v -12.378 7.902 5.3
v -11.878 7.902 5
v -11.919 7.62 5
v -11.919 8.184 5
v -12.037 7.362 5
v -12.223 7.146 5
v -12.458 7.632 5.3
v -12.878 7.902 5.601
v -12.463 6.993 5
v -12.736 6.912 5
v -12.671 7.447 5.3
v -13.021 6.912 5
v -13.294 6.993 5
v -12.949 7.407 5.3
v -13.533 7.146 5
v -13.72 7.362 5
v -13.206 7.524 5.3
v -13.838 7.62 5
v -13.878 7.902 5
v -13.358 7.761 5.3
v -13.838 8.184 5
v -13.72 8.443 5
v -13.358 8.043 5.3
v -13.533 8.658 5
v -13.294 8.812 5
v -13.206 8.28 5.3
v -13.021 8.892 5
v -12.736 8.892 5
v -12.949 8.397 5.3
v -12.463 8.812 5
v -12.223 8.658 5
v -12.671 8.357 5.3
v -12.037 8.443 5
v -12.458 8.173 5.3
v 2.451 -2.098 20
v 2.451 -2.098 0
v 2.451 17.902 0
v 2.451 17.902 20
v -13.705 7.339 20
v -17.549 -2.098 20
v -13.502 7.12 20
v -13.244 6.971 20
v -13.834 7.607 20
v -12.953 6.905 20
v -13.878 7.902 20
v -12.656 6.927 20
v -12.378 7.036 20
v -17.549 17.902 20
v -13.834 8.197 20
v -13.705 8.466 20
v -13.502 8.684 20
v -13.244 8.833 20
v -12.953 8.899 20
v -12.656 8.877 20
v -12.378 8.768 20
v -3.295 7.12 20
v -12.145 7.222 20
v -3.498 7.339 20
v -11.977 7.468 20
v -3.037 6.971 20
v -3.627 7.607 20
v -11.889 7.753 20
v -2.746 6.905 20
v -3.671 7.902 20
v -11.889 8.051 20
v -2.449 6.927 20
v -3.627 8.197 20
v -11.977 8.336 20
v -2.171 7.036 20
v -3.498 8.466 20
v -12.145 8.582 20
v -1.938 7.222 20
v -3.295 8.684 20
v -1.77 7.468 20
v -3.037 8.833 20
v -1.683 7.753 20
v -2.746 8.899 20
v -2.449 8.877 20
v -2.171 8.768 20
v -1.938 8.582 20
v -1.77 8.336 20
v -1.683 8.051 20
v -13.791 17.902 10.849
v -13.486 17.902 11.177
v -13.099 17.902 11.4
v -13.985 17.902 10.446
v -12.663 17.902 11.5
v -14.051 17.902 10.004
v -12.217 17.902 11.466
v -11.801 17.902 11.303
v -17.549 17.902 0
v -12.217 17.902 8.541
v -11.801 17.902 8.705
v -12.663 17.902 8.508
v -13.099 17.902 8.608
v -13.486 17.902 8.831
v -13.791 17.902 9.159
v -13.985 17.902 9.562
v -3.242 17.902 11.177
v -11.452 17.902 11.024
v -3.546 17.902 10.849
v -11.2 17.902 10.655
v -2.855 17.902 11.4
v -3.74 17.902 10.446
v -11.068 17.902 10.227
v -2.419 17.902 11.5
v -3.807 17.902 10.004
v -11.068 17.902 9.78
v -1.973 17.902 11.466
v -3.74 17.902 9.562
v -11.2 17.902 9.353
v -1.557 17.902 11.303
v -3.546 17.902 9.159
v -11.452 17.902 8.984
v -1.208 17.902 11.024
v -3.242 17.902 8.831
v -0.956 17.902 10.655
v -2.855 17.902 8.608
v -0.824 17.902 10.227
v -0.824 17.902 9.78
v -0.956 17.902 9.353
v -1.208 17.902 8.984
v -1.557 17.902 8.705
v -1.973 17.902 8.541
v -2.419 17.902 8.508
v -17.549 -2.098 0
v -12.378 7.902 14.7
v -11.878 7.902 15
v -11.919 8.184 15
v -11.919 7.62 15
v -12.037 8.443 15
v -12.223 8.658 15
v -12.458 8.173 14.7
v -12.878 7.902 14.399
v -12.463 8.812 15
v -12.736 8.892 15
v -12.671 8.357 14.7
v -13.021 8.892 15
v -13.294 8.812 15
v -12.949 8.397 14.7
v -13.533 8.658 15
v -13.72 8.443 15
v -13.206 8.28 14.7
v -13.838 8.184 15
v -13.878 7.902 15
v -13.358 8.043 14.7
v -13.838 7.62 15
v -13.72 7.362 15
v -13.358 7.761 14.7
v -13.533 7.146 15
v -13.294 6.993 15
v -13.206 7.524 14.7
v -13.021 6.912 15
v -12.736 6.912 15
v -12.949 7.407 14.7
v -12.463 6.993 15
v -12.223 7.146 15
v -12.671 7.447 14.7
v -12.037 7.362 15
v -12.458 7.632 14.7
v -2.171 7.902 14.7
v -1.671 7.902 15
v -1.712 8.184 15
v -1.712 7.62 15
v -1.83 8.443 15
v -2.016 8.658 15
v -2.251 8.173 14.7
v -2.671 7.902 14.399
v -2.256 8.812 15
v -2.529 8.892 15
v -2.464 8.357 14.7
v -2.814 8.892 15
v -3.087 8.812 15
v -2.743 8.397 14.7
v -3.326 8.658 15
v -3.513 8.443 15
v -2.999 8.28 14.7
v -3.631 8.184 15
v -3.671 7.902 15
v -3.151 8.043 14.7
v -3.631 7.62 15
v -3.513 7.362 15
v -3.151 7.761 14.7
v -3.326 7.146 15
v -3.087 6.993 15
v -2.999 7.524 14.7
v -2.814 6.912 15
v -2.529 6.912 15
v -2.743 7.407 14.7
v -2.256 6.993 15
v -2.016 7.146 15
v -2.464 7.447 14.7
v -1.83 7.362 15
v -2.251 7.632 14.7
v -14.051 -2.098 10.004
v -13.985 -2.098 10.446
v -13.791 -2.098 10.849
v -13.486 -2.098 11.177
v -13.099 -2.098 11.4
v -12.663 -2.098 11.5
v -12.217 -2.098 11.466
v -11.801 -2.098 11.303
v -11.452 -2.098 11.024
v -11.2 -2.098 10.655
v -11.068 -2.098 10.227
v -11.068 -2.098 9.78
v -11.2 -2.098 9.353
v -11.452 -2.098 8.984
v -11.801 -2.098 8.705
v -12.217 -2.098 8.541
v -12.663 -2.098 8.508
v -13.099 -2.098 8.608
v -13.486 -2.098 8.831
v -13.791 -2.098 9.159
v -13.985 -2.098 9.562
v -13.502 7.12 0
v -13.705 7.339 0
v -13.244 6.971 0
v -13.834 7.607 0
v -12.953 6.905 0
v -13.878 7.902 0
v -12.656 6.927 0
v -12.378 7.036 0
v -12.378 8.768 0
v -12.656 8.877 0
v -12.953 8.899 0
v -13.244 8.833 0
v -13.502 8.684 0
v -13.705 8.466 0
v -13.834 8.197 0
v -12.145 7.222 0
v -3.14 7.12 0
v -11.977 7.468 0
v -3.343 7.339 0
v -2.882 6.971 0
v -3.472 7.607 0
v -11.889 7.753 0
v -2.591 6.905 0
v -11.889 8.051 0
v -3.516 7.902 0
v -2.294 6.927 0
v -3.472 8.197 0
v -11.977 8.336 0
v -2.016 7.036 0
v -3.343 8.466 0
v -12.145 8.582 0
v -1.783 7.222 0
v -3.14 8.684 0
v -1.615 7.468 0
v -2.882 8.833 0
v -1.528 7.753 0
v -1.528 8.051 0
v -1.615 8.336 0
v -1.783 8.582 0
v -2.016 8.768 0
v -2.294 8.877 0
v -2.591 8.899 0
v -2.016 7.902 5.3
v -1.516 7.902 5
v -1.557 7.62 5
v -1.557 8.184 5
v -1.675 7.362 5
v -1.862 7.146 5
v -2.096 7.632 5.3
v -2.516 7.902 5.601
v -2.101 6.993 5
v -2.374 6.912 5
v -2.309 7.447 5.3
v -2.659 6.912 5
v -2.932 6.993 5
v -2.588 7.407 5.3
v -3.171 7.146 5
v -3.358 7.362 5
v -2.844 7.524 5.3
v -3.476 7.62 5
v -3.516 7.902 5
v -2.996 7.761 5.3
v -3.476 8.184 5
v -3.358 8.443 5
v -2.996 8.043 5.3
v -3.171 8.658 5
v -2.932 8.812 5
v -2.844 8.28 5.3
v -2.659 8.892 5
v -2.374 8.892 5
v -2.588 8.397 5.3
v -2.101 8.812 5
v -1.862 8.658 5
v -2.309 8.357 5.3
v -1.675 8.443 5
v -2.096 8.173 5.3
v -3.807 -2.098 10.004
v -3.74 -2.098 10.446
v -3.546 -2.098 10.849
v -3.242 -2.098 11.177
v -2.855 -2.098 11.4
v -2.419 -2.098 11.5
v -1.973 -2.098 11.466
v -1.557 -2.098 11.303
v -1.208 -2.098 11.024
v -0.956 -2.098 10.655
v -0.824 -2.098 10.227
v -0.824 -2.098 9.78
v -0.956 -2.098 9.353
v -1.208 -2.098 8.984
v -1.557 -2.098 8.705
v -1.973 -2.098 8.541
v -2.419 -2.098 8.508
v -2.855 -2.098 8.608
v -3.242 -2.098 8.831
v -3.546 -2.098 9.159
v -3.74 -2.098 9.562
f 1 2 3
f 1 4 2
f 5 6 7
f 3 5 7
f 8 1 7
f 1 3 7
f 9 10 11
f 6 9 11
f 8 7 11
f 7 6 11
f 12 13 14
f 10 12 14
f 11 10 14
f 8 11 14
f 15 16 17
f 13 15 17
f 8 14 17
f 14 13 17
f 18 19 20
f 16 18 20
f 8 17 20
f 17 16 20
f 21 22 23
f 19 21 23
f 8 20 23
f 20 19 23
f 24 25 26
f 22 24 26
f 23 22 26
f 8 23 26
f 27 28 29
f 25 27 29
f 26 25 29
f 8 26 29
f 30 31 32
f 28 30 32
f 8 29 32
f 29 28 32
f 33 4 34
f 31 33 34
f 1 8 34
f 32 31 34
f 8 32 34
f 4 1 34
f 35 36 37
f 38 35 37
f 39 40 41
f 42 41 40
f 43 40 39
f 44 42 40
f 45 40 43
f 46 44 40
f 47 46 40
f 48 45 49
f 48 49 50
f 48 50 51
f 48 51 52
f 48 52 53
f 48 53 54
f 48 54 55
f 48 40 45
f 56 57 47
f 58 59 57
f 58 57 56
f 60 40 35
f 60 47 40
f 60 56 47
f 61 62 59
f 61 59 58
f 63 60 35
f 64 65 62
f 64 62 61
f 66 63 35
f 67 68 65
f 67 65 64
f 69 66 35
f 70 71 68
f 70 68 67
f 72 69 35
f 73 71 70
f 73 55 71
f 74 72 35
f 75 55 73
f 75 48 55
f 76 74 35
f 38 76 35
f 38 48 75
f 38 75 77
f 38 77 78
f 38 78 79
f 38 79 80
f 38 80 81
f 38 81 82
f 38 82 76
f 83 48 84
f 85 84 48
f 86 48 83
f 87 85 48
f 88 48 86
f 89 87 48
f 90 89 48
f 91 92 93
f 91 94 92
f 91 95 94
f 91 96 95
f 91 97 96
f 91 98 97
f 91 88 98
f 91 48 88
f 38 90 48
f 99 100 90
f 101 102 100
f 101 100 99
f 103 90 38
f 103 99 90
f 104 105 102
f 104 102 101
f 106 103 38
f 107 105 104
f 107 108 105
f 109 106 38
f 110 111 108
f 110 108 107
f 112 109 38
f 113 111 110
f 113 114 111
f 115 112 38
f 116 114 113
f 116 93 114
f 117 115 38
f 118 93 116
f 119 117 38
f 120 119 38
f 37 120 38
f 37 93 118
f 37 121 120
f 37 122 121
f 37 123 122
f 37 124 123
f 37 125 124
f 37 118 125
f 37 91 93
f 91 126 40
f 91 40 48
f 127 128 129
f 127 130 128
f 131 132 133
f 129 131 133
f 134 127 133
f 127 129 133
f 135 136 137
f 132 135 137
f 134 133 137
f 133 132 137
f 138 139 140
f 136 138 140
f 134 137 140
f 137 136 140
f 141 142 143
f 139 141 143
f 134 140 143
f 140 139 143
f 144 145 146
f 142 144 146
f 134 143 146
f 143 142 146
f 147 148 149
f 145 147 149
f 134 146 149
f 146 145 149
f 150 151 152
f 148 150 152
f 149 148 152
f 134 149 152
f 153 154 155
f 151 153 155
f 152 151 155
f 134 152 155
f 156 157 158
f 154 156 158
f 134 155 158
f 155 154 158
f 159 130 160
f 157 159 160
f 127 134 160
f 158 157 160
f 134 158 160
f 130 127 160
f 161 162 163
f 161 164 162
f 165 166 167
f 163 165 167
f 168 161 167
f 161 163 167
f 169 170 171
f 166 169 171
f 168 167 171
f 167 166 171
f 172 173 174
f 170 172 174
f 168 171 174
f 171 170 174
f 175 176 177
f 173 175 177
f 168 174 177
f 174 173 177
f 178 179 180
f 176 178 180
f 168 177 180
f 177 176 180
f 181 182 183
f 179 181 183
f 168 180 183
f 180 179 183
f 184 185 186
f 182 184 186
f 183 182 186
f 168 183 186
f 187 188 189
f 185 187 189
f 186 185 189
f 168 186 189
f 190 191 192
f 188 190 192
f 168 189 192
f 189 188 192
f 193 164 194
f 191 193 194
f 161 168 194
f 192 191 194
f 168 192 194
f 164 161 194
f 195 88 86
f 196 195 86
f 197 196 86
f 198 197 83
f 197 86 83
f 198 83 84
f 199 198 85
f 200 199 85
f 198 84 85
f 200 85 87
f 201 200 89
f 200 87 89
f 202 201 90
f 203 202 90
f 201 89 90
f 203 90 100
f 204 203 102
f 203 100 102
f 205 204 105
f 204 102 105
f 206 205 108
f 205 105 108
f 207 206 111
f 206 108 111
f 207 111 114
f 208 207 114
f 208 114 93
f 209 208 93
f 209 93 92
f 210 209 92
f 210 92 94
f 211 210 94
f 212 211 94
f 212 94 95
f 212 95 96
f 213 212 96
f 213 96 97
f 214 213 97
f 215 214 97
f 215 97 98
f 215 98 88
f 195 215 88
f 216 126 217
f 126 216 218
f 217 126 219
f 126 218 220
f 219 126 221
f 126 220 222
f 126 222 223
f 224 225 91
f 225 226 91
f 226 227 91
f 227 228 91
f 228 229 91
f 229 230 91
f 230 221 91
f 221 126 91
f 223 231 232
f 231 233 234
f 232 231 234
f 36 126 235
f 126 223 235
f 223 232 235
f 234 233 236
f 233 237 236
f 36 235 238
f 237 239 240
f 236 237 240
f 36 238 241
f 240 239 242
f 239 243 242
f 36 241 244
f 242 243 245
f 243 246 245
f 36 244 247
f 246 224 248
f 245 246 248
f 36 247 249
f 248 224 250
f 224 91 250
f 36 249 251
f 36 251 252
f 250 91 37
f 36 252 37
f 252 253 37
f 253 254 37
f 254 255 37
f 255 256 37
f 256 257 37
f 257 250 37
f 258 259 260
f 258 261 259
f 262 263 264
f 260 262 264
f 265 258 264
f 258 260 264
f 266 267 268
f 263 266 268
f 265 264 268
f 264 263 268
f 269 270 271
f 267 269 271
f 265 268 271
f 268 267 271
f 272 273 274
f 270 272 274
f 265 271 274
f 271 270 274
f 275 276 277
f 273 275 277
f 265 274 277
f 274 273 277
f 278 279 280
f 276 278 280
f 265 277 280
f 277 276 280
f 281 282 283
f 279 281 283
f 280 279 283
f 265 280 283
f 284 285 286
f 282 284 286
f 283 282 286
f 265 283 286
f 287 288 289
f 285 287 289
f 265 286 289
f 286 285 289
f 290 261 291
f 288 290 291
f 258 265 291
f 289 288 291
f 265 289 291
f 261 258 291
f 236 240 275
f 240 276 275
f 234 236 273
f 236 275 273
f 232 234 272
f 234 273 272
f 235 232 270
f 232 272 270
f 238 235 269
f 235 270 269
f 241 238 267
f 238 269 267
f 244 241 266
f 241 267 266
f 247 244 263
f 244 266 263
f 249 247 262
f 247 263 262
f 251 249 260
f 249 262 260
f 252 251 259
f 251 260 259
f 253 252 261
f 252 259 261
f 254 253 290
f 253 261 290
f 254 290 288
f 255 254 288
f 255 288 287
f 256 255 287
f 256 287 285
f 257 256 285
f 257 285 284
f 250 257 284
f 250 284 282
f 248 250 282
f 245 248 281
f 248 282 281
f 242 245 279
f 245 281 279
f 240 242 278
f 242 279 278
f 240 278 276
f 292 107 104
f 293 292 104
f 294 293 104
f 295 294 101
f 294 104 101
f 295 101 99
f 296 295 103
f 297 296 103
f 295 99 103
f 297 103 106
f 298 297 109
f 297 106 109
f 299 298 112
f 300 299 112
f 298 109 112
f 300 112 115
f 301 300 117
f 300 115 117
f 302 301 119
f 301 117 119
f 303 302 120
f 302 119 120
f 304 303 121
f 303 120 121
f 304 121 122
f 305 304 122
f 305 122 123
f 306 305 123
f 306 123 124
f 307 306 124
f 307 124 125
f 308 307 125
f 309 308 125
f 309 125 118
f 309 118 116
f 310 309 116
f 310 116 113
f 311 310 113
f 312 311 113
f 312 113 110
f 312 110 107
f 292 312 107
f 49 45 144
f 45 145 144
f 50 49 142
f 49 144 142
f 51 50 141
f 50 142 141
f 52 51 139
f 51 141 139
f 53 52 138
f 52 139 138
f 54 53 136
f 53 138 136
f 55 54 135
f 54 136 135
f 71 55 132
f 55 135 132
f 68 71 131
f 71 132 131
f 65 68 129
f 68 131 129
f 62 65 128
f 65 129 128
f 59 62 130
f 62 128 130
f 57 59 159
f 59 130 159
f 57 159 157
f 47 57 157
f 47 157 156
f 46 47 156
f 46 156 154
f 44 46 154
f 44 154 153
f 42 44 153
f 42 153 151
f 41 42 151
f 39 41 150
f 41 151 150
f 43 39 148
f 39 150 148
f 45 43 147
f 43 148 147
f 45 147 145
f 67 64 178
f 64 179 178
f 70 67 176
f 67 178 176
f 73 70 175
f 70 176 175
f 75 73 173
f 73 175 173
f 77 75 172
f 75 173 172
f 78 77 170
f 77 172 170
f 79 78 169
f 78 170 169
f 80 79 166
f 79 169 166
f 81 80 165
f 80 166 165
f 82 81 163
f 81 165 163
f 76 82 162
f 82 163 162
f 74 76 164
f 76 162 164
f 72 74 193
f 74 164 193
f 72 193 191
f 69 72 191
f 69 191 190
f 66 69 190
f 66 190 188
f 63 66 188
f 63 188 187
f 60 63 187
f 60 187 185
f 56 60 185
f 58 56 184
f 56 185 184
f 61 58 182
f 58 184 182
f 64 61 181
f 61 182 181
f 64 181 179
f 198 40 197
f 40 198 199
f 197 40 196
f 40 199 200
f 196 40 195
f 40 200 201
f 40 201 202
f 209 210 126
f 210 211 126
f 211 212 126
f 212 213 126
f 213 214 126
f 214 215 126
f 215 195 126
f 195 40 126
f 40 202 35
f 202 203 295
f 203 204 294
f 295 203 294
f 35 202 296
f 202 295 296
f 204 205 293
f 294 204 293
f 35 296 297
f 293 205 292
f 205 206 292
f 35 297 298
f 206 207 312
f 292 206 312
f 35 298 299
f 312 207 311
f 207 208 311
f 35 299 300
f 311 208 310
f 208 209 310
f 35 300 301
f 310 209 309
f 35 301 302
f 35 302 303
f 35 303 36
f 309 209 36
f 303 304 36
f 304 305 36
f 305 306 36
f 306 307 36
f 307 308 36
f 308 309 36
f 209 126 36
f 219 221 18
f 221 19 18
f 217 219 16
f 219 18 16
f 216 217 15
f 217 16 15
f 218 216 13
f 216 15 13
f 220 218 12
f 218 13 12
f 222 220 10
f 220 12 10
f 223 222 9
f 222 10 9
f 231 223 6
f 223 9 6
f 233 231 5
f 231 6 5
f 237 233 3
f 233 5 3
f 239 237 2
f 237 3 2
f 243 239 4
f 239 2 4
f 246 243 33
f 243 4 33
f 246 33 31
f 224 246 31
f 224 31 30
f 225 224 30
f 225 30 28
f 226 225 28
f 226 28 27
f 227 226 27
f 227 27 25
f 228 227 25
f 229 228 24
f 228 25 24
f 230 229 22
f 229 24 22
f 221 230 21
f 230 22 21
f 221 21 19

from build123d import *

# Parameters (mm, degrees)
F0_W     = 20
F0_H     = 20
F1_DEPTH = 20
F2_DEPTH = 20
F3_D     = 2
F3_DEPTH = 5
F3_TIP   = 0.600860619
F5_D     = 2
F5_DEPTH = 5
F5_TIP   = 0.600860619
F7_D     = 3


with BuildPart() as f1:
    # F0 (on Top) → F1 (new body)
    with BuildSketch(Plane.XY):
        with Locations((-7.549341768, 7.9021853259)):
            Rectangle(F0_W, F0_H)
    extrude(amount=F1_DEPTH)

    # F0 (on Top) → F2 (join)
    with BuildSketch(Plane.XY):
        with Locations((-7.549341768, 7.9021853259)):
            Rectangle(F0_W, F0_H)
    extrude(amount=F2_DEPTH)

    # F3
    with Locations(Plane(origin=(0, 0, 0), x_dir=(1, 0, 0), z_dir=(0, 0, -1))):
        with Locations((-12.8782894462, -7.9021853259), (-2.5164496619, -7.9021853259)):
            Hole(F3_D / 2, depth=F3_DEPTH)
            with Locations((0, 0, -(F3_DEPTH + F3_TIP / 2))):  # 118° drill point
                Cone(0, F3_D / 2, F3_TIP, mode=Mode.SUBTRACT)

    # F5
    with Locations(Plane.XY.offset(20)):
        with Locations((-12.8782894462, 7.9021853259), (-2.6713556144, 7.9021853259)):
            Hole(F5_D / 2, depth=F5_DEPTH)
            with Locations((0, 0, -(F5_DEPTH + F5_TIP / 2))):  # 118° drill point
                Cone(0, F5_D / 2, F5_TIP, mode=Mode.SUBTRACT)

    # F7 (through all)
    with Locations(Plane.XZ.offset(2.0978146741)):
        with Locations((-12.5512500335, 10.0038165309), (-2.3071385143, 10.0038165309)):
            Hole(F7_D / 2)


solid = f1.part
